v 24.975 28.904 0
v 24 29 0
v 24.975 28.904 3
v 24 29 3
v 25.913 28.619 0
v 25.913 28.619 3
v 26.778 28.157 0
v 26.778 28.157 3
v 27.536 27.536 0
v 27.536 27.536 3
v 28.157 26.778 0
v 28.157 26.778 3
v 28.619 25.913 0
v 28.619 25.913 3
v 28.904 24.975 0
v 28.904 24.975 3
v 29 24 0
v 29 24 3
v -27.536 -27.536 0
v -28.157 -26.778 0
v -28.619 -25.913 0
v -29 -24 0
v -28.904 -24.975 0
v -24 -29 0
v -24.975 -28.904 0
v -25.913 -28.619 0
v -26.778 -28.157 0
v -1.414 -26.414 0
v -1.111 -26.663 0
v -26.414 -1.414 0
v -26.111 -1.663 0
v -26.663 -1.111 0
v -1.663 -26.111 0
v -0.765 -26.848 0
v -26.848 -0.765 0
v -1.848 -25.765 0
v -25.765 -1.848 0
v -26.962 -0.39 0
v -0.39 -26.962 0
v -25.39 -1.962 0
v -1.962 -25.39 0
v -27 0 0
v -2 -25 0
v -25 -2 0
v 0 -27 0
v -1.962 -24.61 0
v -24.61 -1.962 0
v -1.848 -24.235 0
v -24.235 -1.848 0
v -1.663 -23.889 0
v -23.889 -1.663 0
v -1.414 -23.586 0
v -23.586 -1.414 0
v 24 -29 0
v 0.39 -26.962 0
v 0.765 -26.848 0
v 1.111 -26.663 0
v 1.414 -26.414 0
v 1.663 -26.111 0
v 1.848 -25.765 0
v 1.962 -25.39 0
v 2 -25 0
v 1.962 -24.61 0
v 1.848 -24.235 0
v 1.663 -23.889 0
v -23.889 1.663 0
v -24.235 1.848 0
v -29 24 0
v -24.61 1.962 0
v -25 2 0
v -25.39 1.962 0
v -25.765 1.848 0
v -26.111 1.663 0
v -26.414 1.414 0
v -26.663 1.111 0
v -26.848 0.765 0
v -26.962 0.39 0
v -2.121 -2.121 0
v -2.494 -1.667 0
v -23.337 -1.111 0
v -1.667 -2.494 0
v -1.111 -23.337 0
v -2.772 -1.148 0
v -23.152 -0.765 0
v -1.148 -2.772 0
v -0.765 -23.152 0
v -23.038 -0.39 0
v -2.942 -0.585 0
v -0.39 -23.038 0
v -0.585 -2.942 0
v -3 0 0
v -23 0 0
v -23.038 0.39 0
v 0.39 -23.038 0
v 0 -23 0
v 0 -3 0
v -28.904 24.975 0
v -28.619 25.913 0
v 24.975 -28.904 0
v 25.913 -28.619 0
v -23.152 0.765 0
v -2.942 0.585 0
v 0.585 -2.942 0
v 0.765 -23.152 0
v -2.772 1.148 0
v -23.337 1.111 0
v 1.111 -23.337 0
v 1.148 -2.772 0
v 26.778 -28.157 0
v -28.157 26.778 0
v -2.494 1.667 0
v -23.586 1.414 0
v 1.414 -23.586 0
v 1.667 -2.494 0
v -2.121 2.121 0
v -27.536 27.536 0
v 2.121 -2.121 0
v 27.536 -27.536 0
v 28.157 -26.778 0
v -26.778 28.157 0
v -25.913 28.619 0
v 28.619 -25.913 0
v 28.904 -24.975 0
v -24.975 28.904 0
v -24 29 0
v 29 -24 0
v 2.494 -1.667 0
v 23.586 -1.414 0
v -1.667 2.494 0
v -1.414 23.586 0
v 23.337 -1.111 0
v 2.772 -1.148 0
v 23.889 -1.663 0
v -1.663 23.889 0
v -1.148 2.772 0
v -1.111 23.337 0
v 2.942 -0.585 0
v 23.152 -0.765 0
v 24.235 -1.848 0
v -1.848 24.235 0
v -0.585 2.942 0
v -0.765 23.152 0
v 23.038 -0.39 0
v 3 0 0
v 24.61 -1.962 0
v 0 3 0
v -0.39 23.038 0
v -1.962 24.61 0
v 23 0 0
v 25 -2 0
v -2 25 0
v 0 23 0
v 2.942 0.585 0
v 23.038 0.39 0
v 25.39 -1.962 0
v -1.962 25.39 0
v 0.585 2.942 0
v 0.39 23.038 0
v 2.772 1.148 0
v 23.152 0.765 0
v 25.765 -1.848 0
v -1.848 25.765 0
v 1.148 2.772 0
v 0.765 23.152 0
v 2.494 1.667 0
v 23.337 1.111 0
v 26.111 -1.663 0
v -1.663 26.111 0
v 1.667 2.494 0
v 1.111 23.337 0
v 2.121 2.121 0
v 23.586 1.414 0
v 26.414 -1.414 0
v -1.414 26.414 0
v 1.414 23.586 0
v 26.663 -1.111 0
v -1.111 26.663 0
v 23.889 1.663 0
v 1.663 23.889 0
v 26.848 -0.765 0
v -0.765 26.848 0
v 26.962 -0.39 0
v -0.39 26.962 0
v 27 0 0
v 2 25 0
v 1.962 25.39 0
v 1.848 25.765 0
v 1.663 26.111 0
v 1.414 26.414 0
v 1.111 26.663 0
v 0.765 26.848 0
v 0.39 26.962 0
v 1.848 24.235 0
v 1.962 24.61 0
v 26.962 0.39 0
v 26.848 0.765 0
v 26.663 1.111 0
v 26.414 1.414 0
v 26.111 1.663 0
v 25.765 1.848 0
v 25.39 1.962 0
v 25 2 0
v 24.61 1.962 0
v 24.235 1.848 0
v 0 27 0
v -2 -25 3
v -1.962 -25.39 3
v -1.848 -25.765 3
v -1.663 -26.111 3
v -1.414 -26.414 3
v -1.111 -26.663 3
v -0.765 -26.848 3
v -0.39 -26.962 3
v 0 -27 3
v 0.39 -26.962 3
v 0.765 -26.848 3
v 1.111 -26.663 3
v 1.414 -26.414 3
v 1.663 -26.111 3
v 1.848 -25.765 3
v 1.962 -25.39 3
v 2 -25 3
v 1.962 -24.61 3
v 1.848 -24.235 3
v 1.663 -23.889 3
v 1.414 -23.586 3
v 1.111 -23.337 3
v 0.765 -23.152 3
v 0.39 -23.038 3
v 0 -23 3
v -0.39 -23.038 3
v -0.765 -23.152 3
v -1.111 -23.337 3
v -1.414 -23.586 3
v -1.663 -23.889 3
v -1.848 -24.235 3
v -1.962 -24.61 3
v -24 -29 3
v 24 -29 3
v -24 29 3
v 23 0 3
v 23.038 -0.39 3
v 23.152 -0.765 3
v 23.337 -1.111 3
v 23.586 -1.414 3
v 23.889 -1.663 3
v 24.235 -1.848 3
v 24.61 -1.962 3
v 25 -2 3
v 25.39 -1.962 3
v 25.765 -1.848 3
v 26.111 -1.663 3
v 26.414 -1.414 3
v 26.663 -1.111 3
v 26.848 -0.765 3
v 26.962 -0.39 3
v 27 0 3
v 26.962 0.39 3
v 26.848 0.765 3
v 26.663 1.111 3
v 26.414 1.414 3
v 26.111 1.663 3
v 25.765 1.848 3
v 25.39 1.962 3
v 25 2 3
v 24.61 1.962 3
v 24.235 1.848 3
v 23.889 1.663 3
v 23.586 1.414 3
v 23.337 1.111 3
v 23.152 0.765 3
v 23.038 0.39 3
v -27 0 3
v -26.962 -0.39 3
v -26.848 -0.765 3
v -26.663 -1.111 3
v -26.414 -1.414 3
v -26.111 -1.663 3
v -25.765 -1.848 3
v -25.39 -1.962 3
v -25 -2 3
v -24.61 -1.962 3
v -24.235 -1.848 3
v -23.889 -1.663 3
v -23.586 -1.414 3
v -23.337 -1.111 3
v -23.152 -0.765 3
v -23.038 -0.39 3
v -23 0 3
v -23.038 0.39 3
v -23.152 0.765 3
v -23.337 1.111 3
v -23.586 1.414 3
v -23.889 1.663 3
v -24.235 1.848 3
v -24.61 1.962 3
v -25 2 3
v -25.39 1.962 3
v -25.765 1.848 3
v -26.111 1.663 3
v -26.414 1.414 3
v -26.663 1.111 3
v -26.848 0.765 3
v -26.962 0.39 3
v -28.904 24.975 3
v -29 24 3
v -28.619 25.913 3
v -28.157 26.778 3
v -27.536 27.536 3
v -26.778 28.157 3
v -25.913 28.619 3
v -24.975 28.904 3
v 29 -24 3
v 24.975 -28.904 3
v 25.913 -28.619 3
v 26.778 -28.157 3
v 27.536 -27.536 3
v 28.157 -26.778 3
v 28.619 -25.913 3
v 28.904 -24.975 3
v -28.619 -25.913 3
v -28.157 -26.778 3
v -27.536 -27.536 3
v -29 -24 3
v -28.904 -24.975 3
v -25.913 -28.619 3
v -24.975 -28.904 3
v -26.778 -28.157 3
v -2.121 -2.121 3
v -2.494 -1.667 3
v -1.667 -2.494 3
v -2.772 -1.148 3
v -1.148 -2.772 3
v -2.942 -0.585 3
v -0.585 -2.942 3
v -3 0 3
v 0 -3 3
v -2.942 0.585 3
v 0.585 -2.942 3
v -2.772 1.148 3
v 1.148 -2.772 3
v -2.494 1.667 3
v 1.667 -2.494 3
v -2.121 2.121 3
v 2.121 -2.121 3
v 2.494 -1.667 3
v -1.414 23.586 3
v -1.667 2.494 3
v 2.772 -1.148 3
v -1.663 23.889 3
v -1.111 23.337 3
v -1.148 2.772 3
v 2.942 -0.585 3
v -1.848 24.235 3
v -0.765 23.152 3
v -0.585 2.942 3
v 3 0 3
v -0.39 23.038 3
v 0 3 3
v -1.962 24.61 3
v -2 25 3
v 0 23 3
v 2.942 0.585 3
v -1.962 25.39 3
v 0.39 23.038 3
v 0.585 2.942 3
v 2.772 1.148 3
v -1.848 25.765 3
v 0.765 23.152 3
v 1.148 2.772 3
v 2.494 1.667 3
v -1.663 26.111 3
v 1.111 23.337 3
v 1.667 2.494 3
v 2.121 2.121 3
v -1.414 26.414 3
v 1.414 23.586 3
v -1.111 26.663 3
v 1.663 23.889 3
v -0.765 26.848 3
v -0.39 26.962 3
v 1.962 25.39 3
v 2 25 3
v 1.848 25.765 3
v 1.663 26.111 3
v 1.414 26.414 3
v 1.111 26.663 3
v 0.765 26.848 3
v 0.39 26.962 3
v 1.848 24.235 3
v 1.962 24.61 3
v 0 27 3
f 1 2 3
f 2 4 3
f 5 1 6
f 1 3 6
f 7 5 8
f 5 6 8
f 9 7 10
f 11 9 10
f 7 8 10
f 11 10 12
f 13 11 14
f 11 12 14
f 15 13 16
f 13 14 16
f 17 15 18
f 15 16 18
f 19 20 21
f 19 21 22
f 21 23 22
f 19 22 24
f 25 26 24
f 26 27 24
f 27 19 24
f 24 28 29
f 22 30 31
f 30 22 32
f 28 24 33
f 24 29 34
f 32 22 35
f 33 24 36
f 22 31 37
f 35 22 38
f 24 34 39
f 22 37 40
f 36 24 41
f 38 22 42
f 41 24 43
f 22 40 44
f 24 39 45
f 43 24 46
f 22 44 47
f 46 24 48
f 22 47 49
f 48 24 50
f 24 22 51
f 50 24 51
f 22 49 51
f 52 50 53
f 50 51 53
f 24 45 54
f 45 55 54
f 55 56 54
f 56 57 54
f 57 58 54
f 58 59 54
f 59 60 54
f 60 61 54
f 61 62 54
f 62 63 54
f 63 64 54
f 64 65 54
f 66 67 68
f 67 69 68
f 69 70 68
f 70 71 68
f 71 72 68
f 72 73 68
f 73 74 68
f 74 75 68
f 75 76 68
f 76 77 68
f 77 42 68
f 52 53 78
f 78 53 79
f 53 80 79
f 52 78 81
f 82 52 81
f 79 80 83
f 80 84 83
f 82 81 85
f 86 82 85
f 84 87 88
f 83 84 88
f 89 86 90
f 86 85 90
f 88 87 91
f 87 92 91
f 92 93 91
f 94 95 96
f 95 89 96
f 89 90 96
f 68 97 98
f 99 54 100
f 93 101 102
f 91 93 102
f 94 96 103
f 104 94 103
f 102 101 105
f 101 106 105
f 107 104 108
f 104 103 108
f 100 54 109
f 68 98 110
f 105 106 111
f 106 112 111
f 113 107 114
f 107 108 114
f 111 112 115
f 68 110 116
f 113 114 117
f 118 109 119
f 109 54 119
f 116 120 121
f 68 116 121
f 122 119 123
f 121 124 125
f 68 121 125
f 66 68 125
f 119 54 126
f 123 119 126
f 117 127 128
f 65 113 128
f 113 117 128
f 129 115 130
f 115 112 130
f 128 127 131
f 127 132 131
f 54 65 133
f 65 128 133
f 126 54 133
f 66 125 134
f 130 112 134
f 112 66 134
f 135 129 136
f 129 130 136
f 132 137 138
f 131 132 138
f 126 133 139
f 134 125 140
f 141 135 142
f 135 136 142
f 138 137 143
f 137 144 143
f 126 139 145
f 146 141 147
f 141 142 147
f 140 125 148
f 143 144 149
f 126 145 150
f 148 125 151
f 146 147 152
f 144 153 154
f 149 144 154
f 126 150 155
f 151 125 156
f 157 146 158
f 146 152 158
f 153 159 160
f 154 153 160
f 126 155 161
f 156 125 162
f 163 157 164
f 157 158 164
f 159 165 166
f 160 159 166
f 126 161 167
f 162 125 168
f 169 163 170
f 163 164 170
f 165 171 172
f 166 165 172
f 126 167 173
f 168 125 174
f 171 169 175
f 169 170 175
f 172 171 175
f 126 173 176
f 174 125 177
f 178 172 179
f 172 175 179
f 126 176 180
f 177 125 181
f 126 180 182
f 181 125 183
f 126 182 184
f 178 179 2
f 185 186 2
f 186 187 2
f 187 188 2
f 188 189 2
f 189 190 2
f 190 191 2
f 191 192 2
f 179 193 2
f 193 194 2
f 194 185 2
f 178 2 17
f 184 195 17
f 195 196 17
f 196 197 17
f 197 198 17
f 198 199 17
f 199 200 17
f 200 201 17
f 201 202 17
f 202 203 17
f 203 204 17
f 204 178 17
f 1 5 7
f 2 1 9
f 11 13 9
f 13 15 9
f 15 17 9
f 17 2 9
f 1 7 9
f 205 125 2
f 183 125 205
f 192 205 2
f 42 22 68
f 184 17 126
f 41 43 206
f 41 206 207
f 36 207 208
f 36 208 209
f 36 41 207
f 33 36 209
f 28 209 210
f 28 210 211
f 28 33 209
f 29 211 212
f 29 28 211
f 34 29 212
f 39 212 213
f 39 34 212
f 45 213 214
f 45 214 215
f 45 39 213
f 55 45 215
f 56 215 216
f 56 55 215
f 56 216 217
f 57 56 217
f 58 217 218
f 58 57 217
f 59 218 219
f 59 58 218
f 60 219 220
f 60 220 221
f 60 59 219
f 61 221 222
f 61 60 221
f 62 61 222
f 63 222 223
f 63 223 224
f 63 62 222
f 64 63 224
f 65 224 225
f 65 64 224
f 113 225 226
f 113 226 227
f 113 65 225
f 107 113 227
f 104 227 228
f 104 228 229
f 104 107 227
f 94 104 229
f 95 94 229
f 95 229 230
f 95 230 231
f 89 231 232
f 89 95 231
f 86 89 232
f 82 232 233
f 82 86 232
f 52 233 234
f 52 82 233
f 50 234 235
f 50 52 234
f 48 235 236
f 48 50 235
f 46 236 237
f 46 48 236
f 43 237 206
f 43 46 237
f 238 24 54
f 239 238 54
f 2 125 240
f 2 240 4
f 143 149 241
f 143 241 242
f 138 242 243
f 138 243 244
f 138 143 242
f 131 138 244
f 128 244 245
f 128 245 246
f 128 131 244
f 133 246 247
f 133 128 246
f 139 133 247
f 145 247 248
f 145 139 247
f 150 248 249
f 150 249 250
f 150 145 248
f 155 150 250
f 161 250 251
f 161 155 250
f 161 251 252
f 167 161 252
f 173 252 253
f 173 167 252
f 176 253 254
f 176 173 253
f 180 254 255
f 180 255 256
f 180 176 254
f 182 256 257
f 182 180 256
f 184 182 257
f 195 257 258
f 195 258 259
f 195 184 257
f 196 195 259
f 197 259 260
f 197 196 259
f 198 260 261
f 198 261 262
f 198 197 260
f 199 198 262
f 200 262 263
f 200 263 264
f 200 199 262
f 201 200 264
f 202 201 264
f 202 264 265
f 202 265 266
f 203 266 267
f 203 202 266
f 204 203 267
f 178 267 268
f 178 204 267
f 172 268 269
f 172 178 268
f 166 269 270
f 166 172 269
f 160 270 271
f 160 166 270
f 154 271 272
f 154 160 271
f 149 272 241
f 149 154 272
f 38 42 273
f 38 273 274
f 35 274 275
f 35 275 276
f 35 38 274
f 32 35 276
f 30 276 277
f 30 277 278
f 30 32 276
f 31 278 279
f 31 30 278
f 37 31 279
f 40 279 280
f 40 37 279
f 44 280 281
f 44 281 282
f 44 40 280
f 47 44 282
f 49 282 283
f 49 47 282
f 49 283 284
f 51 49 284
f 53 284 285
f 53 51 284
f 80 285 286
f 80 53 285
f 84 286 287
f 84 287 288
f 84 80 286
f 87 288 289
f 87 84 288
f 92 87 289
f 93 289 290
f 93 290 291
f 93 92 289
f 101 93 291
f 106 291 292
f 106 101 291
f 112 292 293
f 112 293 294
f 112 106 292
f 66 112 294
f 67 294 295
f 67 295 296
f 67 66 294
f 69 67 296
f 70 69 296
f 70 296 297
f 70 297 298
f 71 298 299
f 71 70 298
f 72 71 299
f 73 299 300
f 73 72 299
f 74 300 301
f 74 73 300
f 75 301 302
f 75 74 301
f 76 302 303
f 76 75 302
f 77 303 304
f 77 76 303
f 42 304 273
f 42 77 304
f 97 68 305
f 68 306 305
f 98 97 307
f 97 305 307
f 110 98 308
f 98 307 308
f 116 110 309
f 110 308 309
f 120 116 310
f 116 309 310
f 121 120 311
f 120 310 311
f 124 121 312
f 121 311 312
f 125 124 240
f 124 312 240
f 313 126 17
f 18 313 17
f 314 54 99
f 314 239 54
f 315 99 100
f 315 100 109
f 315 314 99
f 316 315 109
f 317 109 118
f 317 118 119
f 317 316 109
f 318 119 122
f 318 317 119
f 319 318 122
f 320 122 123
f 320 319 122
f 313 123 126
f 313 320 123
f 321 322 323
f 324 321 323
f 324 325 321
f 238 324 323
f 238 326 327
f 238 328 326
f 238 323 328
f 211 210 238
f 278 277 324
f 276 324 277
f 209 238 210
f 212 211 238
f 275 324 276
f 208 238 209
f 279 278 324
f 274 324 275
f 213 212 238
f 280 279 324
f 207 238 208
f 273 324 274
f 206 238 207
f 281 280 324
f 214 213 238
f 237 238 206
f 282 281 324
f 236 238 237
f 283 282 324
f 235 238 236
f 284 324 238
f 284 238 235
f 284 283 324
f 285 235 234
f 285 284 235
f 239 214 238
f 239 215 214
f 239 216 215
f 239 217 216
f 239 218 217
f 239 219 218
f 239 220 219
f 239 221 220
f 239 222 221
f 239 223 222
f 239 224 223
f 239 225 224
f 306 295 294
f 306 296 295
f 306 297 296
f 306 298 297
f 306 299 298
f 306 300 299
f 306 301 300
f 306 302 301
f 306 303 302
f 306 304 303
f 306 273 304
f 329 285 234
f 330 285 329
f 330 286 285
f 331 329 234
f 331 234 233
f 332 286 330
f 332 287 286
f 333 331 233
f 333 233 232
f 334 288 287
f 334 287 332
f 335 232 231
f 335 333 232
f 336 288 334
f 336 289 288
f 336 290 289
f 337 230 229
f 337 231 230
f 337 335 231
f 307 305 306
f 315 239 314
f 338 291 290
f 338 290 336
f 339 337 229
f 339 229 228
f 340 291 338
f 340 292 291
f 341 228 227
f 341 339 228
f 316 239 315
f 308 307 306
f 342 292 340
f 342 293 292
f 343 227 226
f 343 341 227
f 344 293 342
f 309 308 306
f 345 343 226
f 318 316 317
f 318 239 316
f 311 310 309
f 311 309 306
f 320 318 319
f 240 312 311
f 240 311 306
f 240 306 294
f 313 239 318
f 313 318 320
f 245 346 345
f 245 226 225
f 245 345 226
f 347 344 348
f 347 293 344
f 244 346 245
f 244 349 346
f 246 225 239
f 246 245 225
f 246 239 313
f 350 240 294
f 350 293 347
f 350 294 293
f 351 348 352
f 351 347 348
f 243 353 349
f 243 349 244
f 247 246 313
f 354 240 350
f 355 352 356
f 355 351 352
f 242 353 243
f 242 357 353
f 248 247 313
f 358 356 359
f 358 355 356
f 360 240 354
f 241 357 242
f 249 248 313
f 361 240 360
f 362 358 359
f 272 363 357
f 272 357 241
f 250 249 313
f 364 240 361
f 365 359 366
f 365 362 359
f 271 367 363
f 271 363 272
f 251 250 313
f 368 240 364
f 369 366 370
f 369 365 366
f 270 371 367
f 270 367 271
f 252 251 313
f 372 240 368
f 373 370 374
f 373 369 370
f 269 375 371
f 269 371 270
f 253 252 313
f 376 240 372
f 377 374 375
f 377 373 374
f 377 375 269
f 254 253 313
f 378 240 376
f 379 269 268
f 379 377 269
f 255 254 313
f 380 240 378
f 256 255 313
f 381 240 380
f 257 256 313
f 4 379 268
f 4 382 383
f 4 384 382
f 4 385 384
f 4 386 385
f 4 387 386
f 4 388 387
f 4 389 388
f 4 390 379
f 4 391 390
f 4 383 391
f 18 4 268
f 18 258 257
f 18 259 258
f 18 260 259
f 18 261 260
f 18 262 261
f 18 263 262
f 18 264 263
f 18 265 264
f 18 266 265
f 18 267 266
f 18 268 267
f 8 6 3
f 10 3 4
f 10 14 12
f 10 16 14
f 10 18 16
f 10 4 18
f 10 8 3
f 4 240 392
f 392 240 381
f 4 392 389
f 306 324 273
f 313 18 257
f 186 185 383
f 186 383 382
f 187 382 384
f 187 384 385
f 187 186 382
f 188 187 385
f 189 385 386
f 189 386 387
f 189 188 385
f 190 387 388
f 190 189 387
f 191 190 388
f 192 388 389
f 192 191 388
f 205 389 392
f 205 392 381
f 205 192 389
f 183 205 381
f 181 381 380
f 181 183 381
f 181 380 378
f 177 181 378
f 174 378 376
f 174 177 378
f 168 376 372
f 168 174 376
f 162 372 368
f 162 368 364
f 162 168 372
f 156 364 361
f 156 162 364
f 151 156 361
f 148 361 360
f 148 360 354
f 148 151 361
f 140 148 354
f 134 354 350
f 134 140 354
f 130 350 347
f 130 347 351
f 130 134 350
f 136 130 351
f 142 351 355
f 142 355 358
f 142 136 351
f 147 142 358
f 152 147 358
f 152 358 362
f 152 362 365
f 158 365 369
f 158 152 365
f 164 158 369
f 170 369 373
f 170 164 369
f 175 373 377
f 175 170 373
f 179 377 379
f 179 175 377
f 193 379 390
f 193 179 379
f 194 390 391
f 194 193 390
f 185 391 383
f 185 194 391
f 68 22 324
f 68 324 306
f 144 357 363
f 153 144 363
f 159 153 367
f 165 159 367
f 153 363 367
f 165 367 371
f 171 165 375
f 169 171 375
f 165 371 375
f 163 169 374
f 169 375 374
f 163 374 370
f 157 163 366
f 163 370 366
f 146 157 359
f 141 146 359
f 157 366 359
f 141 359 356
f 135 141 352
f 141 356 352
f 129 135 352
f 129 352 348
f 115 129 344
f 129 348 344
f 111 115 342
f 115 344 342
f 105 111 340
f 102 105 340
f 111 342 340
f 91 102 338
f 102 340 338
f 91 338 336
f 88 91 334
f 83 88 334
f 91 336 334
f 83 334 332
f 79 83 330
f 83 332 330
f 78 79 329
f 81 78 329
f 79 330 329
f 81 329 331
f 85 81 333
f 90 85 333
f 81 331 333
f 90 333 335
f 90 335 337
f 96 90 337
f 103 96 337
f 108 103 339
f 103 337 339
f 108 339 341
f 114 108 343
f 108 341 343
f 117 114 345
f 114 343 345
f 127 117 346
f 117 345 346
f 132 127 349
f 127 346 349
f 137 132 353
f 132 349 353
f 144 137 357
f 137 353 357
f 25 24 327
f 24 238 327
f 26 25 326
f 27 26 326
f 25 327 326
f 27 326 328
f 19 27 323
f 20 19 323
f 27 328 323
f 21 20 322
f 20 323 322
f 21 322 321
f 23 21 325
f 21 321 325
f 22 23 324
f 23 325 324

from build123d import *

# Parameters (mm, degrees)
SKETCH_1_W          = 58
SKETCH_1_H          = 58
SKETCH_1_R          = 2
EXTRUDE_1_DEPTH     = 3
FILLET_2_R          = 5
FILLET_3_R          = 5
FILLET_4_R          = 5
FILLET_5_R          = 5
SKETCH_2_R          = 3
CUT_EXTRUDE_1_DEPTH = 3


with BuildPart() as part:
    # Эскиз1 → Бобышка-Вытянуть1 (new body)
    with BuildSketch(Plane.XY):
        Rectangle(SKETCH_1_W, SKETCH_1_H)
        with Locations((0, 25)):
            Circle(SKETCH_1_R, mode=Mode.SUBTRACT)
        with Locations(Location((-25, 0, 0), (0, 0, 180))):
            Circle(SKETCH_1_R, mode=Mode.SUBTRACT)
        with Locations(Location((0, -25, 0), (0, 0, 180))):
            Circle(SKETCH_1_R, mode=Mode.SUBTRACT)
        with Locations(Location((25, 0, 0), (0, 0, 180))):
            Circle(SKETCH_1_R, mode=Mode.SUBTRACT)
    extrude(amount=EXTRUDE_1_DEPTH)

    # Скругление2
    fillet_2_edges = [part.edges().sort_by_distance(p)[0] for p in [
        (29, -29, 1.5),
    ]]
    fillet(fillet_2_edges, radius=FILLET_2_R)

    # Скругление3
    fillet_3_edges = [part.edges().sort_by_distance(p)[0] for p in [
        (-29, -29, 1.5),
    ]]
    fillet(fillet_3_edges, radius=FILLET_3_R)

    # Скругление4
    fillet_4_edges = [part.edges().sort_by_distance(p)[0] for p in [
        (-29, 29, 1.5),
    ]]
    fillet(fillet_4_edges, radius=FILLET_4_R)

    # Скругление5
    fillet_5_edges = [part.edges().sort_by_distance(p)[0] for p in [
        (29, 29, 1.5),
    ]]
    fillet(fillet_5_edges, radius=FILLET_5_R)

    # Эскиз2 → Вырез-Вытянуть1 (cut)
    with BuildSketch(Plane.XY.offset(3)):
        Circle(SKETCH_2_R)
    extrude(amount=-CUT_EXTRUDE_1_DEPTH, mode=Mode.SUBTRACT)


solid = part.part
